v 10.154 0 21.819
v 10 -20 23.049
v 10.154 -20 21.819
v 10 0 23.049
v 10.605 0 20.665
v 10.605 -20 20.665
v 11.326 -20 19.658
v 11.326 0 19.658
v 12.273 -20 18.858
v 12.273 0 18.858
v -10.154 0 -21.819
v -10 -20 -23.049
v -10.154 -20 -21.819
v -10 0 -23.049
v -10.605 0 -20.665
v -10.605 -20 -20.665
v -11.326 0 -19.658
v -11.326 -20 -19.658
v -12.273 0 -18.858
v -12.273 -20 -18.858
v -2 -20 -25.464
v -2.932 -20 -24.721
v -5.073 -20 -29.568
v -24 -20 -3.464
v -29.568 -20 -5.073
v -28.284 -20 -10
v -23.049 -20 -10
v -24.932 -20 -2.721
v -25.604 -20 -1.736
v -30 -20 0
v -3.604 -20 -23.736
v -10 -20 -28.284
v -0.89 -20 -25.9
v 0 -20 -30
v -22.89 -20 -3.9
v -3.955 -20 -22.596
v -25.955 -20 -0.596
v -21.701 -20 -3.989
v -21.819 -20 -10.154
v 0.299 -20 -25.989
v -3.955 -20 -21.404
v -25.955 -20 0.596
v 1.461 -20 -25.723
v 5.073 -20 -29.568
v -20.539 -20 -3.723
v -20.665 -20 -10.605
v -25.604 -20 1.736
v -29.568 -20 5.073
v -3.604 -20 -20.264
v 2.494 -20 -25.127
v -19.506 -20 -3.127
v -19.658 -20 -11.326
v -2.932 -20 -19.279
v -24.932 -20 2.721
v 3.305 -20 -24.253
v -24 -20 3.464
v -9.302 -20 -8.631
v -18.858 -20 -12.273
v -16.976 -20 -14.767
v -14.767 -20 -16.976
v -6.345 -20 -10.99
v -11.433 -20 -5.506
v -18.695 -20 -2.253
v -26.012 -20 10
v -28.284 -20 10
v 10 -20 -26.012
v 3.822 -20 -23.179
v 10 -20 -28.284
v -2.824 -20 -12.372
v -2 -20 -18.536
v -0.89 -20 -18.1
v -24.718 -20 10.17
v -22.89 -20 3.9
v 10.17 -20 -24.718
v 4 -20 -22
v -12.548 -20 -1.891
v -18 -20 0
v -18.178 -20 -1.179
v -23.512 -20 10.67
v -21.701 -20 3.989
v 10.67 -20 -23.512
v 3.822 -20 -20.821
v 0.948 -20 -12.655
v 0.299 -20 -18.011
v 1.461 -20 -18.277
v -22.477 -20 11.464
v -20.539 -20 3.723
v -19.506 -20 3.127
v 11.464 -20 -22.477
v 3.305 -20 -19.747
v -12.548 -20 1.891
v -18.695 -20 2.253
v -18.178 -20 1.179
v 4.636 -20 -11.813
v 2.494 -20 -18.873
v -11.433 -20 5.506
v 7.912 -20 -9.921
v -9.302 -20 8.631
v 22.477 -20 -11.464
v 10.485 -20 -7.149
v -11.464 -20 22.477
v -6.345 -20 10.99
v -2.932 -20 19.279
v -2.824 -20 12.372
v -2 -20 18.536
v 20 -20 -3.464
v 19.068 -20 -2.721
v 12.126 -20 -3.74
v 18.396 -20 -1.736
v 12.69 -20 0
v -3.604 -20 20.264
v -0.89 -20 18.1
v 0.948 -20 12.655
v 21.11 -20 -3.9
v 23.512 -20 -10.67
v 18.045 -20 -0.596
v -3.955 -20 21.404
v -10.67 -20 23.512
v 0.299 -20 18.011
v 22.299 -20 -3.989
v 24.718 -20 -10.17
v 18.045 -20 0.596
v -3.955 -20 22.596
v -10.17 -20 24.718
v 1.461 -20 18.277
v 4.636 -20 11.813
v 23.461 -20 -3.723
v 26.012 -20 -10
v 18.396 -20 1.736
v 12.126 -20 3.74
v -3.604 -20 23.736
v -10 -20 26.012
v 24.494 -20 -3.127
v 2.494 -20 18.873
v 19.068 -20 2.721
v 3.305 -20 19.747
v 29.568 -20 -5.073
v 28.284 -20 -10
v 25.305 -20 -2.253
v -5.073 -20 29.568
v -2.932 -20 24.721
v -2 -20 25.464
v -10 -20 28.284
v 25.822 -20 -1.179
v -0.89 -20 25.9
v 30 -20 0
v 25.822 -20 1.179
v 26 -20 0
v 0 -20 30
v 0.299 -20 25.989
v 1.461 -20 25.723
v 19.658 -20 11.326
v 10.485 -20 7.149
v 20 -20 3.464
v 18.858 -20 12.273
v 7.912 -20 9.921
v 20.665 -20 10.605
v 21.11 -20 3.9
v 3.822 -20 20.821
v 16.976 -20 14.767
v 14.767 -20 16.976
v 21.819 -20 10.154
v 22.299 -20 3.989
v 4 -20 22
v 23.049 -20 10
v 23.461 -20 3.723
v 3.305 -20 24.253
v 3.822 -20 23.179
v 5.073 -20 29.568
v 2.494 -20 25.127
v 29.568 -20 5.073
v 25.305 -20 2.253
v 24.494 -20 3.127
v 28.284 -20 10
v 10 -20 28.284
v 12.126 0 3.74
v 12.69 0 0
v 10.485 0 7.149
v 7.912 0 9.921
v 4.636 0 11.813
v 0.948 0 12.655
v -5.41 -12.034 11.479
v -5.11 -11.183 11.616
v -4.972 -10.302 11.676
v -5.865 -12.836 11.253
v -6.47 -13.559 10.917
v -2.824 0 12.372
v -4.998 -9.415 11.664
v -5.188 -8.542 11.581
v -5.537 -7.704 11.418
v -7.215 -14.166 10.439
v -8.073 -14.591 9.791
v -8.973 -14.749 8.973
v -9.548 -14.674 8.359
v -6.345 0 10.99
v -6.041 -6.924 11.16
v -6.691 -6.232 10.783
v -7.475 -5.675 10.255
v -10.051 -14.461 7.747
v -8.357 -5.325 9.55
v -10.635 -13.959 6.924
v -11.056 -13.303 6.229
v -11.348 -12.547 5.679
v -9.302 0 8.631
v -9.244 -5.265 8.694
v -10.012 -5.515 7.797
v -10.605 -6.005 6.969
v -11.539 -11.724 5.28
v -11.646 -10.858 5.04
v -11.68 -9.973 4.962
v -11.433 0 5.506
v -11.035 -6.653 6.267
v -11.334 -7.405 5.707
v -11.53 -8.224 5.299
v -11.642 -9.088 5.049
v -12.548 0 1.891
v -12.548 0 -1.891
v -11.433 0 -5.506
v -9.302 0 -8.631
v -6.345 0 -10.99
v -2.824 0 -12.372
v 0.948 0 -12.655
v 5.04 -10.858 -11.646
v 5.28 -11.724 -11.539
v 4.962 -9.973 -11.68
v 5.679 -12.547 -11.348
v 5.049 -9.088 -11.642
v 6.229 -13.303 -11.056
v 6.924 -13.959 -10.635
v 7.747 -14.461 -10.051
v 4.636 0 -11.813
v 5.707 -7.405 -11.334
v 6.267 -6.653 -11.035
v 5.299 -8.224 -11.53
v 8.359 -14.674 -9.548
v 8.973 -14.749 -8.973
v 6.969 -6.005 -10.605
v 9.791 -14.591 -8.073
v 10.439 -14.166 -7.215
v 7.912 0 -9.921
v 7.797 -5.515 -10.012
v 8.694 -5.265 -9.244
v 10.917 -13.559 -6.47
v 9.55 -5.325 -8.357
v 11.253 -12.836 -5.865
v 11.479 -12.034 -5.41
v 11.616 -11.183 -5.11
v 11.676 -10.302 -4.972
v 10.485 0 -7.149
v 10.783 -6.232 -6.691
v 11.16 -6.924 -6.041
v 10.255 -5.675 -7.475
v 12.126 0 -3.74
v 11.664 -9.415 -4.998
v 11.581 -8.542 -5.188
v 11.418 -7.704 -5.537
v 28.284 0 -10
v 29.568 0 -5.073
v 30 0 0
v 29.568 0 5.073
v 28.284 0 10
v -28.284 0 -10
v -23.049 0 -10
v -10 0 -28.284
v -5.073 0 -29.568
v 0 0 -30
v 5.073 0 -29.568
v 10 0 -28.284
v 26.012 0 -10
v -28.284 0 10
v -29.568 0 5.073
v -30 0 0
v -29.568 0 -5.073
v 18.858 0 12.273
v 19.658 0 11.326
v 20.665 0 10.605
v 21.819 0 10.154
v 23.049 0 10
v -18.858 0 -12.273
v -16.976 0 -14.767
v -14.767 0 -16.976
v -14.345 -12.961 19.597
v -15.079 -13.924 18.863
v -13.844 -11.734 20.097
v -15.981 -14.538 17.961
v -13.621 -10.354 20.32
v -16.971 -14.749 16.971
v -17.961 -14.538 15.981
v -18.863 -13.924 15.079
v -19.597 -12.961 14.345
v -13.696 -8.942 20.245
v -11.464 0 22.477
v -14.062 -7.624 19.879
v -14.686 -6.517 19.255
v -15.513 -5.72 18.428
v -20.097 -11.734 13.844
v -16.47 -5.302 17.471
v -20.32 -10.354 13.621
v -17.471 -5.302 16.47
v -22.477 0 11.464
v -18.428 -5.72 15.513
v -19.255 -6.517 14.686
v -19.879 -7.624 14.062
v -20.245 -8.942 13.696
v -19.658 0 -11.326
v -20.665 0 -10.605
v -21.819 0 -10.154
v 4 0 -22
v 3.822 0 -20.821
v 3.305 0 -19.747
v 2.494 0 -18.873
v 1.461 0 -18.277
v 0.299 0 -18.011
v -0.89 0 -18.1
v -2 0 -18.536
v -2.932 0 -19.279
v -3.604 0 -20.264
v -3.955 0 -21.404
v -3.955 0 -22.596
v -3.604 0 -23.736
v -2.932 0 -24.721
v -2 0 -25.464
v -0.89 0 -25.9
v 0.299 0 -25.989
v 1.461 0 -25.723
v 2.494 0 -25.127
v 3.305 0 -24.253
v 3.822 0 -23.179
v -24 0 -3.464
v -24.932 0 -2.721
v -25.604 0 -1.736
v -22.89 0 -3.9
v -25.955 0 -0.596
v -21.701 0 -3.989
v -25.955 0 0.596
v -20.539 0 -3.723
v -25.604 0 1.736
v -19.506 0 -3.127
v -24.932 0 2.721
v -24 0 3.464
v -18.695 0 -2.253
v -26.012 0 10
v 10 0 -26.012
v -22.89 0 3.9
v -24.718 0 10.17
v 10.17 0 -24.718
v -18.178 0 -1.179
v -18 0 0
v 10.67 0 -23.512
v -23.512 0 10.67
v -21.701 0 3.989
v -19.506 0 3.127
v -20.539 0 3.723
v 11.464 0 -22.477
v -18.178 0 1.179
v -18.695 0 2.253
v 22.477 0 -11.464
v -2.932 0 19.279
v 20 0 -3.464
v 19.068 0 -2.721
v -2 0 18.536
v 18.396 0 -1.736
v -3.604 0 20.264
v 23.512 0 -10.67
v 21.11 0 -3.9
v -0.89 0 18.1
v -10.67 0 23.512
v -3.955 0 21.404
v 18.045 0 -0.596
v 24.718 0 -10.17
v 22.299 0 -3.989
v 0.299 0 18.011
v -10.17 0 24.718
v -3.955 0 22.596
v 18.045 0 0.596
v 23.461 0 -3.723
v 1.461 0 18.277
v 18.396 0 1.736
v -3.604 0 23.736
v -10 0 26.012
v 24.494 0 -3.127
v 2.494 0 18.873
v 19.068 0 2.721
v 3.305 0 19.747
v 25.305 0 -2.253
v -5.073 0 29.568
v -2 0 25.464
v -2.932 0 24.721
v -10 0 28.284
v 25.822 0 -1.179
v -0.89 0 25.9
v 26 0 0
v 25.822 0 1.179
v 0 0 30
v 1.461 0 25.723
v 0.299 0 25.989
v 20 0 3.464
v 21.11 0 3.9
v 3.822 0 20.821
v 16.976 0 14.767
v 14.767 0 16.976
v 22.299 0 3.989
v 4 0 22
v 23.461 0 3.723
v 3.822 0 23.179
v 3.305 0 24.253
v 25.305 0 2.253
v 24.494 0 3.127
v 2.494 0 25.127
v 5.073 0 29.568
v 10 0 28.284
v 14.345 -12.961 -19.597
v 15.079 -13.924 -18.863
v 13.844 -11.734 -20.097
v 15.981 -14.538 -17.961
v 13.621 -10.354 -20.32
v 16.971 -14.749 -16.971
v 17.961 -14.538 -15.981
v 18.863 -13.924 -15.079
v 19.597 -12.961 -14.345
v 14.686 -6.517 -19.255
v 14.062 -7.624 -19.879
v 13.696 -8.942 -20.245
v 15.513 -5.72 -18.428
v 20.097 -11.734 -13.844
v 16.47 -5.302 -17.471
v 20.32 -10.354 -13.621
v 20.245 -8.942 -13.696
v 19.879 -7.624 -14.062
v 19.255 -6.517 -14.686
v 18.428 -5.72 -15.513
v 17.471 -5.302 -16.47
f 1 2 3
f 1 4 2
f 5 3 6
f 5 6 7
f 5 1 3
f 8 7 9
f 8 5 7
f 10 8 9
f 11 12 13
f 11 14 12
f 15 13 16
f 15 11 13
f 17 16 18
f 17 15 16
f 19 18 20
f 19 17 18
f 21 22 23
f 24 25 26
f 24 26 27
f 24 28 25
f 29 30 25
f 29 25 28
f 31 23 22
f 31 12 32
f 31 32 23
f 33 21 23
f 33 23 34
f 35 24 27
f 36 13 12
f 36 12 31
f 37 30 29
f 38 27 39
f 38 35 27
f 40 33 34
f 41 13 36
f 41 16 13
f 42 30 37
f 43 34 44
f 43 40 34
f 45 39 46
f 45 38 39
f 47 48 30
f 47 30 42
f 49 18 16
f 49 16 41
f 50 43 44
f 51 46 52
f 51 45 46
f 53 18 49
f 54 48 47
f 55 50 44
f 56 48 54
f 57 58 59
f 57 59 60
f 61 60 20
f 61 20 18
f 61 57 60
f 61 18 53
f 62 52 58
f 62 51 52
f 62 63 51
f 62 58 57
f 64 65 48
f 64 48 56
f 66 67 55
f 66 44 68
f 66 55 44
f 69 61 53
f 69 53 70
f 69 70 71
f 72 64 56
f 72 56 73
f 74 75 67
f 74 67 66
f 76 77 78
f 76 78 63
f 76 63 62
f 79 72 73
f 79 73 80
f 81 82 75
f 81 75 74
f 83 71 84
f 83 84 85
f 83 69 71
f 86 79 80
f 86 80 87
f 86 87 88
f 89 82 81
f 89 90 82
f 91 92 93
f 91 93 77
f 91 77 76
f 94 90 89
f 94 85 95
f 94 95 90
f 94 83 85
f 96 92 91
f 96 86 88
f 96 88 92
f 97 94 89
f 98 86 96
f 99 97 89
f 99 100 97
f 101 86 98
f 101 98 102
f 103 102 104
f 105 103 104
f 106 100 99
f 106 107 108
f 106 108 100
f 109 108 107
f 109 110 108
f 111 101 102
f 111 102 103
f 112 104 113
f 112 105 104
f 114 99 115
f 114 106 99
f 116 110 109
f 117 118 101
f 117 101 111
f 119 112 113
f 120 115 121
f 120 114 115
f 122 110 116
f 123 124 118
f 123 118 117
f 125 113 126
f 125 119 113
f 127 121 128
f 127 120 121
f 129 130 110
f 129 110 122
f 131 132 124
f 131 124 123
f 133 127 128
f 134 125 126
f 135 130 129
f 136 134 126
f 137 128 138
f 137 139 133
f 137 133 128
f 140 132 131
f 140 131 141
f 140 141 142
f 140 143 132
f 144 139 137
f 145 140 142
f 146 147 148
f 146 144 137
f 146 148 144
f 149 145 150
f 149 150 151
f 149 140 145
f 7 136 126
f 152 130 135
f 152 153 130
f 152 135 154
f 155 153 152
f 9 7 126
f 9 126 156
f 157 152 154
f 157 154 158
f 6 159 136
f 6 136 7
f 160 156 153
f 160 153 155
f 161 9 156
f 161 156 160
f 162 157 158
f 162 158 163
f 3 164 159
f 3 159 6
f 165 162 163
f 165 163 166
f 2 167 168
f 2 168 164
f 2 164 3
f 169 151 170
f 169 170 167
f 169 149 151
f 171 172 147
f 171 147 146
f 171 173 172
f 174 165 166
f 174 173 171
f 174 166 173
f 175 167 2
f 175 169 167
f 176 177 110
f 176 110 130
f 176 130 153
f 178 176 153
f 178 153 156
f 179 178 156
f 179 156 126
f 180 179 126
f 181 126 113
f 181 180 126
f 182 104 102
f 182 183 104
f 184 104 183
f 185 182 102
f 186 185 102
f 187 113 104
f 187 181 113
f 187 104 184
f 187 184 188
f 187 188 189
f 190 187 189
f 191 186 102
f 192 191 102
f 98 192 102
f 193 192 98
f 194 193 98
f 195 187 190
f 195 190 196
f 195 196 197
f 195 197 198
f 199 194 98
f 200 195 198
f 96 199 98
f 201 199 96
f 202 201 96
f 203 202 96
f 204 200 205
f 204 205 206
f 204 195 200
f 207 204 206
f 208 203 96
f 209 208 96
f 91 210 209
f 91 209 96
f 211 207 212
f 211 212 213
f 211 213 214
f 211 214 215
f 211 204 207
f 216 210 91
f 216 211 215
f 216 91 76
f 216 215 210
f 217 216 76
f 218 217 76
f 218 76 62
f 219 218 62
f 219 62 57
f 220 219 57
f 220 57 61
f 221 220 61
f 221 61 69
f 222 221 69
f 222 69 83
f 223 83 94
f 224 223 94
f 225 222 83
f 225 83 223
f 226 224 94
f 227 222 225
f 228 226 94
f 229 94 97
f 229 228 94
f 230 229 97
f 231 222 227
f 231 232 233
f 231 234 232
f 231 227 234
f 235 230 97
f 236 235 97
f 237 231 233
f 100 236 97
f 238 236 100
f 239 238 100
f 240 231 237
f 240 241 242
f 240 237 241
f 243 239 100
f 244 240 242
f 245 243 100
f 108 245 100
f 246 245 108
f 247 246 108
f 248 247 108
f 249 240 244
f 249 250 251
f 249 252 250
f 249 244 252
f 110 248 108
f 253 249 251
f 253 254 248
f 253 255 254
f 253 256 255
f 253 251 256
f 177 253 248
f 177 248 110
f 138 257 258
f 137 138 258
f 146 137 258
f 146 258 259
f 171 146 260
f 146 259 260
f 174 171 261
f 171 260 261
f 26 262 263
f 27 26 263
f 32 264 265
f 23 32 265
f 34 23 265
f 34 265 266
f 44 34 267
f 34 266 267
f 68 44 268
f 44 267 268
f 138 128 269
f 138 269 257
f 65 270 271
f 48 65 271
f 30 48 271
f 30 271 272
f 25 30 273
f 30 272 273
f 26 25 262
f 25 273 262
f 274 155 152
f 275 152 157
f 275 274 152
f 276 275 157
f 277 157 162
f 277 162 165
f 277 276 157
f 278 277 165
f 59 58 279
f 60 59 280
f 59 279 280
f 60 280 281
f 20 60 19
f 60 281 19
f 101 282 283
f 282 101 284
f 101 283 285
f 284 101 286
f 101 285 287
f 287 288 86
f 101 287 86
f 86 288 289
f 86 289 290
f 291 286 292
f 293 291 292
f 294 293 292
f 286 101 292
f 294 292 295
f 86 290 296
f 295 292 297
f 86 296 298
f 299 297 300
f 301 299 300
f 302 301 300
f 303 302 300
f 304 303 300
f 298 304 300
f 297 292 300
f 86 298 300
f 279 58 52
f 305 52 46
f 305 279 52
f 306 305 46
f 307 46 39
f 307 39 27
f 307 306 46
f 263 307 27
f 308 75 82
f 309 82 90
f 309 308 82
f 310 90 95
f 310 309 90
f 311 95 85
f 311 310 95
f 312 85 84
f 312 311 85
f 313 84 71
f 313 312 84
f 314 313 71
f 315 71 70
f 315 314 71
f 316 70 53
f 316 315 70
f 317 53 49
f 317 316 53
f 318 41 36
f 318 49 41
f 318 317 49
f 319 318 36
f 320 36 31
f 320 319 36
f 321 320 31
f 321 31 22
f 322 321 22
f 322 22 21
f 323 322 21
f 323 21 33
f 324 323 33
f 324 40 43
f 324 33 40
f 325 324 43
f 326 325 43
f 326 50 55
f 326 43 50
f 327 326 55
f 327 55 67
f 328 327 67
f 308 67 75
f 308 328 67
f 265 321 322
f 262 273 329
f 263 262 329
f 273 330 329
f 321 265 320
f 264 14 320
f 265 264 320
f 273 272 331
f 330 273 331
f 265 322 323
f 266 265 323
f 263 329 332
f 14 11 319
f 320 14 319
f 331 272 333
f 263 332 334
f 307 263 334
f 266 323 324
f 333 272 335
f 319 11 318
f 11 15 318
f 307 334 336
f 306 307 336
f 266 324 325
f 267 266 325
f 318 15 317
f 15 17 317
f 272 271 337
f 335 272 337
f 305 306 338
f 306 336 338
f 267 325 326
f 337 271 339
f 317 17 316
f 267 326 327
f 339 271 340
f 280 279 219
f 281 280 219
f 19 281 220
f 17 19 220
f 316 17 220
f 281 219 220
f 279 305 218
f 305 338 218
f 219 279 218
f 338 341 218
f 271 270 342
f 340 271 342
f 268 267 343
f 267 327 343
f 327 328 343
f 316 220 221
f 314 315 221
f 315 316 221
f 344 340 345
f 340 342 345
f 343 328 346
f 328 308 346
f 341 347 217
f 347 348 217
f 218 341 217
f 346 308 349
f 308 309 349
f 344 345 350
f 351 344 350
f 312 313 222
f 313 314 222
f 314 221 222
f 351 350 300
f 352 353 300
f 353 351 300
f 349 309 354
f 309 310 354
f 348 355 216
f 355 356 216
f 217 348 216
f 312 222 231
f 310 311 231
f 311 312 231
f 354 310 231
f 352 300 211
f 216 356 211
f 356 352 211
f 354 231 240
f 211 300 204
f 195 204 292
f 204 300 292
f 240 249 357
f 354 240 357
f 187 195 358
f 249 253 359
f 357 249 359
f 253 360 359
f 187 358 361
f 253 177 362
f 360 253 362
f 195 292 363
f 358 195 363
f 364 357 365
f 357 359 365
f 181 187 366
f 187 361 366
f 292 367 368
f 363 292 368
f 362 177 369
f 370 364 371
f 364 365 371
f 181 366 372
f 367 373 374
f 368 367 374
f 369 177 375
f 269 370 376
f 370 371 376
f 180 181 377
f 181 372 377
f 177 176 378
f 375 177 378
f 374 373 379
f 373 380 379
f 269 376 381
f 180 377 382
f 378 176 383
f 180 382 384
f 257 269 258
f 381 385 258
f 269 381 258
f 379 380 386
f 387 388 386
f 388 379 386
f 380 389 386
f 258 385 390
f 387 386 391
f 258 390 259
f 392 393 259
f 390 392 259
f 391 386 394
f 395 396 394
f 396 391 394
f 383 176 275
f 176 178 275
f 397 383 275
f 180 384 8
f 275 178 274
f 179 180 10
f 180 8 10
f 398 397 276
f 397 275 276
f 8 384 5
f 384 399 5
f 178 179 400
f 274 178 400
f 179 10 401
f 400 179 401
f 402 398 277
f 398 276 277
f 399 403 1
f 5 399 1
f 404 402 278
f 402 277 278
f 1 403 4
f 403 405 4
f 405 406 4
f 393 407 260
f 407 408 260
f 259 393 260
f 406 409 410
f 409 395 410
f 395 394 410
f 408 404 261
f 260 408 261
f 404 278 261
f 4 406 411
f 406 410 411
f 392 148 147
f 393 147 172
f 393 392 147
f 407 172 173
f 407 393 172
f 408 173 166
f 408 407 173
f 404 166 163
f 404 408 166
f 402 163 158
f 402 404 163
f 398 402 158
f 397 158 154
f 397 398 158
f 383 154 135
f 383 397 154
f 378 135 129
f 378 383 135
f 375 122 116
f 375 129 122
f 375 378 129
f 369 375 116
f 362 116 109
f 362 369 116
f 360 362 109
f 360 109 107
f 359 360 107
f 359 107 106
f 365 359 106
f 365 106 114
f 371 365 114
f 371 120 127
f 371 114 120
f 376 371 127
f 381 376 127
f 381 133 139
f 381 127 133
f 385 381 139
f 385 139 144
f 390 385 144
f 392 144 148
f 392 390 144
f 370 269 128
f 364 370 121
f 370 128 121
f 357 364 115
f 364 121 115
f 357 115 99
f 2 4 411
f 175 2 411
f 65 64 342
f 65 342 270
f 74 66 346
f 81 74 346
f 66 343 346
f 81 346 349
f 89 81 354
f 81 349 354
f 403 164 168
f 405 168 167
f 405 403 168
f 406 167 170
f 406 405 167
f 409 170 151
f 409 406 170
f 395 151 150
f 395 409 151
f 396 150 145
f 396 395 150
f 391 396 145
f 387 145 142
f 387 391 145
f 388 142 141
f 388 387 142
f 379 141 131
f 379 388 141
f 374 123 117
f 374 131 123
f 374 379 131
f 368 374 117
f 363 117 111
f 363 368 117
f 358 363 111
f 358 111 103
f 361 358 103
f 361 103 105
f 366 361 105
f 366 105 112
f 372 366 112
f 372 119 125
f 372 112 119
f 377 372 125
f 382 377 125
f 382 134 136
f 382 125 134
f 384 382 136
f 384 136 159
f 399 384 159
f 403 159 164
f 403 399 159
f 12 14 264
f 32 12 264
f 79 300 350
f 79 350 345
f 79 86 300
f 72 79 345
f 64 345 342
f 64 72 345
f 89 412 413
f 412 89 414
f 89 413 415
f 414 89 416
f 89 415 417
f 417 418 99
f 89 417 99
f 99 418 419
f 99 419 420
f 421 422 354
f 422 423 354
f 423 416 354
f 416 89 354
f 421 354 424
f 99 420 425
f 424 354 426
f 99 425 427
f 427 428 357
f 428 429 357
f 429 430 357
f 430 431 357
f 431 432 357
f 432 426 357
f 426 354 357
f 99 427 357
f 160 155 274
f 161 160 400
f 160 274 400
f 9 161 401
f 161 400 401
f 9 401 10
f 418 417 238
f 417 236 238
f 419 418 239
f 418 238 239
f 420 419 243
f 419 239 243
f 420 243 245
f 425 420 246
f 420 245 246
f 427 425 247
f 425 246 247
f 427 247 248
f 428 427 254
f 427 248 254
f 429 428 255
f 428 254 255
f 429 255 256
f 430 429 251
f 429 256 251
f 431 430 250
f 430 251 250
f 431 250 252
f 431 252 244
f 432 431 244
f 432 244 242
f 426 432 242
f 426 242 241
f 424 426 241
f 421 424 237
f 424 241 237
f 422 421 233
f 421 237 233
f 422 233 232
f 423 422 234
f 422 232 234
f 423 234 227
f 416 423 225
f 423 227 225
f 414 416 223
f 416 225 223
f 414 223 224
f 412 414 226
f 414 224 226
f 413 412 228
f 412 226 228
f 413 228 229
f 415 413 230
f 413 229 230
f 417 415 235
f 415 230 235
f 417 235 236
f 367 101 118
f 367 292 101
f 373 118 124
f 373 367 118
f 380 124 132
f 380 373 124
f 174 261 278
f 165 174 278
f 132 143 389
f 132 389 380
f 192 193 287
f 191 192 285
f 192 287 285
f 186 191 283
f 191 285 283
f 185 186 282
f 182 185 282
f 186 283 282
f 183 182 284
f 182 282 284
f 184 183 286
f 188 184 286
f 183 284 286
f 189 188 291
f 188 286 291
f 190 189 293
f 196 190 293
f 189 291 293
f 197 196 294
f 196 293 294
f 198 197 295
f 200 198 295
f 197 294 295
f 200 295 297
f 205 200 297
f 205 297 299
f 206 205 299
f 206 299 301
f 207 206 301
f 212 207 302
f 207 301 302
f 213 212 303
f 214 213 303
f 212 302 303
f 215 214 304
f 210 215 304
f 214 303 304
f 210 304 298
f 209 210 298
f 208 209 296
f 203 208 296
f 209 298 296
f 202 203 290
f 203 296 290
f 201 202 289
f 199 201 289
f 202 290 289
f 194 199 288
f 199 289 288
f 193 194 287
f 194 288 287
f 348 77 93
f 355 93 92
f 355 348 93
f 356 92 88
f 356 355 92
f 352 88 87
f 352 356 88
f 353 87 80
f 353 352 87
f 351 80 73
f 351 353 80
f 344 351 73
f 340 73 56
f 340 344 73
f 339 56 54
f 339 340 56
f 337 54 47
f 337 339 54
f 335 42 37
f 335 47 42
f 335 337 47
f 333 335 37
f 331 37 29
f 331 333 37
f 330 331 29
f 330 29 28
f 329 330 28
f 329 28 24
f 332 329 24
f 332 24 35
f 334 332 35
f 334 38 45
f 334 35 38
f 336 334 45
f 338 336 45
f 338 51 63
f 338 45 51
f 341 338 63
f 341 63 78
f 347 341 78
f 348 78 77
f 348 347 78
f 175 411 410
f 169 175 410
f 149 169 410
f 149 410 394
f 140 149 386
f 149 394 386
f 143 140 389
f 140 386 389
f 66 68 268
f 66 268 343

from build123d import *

# Parameters (mm, degrees)
F0_R      = 22.5
F0_R_2    = 12.69
F1_DEPTH  = 20
F3_DEPTH  = 20
F5_R      = 4
F6_DEPTH  = 52.7
F8_DEPTH  = 20
F9_R      = 5
F10_R     = 4.75
F11_DEPTH = 55.8


with BuildPart() as f1:
    # F0 (on Front) → F1 (new body)
    with BuildSketch(Plane.XZ):
        Circle(F0_R)
        Circle(F0_R_2, mode=Mode.SUBTRACT)
    extrude(amount=F1_DEPTH)

    # F2 (on Front) → F3 (join)
    with BuildSketch(Plane.XZ):
        with BuildLine():
            Line((10, 14.3614066163), (10, 28.2842712475))
            ThreePointArc((10, 28.2842712475), (0, 30), (-10, 28.2842712475))
            Line((-10, 28.2842712475), (-10, 14.3614066163))
            ThreePointArc((-10, 14.3614066163), (0, 17.5), (10, 14.3614066163))
        make_face()
        with BuildLine():
            Line((-14.3614066163, 10), (-28.2842712475, 10))
            ThreePointArc((-28.2842712475, 10), (-30, 0), (-28.2842712475, -10))
            Line((-28.2842712475, -10), (-14.3614066163, -10))
            ThreePointArc((-14.3614066163, -10), (-17.5, 0), (-14.3614066163, 10))
        make_face()
        with BuildLine():
            ThreePointArc((28.2842712475, -10), (30, 0), (28.2842712475, 10))
            Line((28.2842712475, 10), (14.3614066163, 10))
            ThreePointArc((14.3614066163, 10), (17.5, 0), (14.3614066163, -10))
            Line((14.3614066163, -10), (28.2842712475, -10))
        make_face()
        with BuildLine():
            Line((-10, -14.3614066163), (-10, -28.2842712475))
            ThreePointArc((-10, -28.2842712475), (0, -30), (10, -28.2842712475))
            Line((10, -28.2842712475), (10, -14.3614066163))
            ThreePointArc((10, -14.3614066163), (0, -17.5), (-10, -14.3614066163))
        make_face()
    extrude(amount=F3_DEPTH)

    # F5 (on Front) → F6 (cut)
    with BuildSketch(Plane.XZ):
        with Locations((0, 22)):
            Circle(F5_R)
        with Locations((0, -22)):
            Circle(F5_R)
        with Locations((22, 0)):
            Circle(F5_R)
        with Locations((-22, 0)):
            Circle(F5_R)
    extrude(amount=F6_DEPTH, mode=Mode.SUBTRACT)

    # F7 (on Front) → F8 (join)
    with BuildSketch(Plane.XZ):
        with BuildLine():
            Line((-7, 26.941125497), (-26.941125497, 7))
            Line((-26.941125497, 7), (-13.2664991614, 7))
            ThreePointArc((-13.2664991614, 7), (-10.6066017178, 10.6066017178), (-7, 13.2664991614))
            Line((-7, 13.2664991614), (-7, 26.941125497))
        make_face()
        with BuildLine():
            Line((26.941125497, -7), (13.2664991614, -7))
            ThreePointArc((13.2664991614, -7), (10.6066017178, -10.6066017178), (7, -13.2664991614))
            Line((7, -13.2664991614), (7, -26.941125497))
            Line((7, -26.941125497), (26.941125497, -7))
        make_face()
    extrude(amount=F8_DEPTH)

    # F9
    f9_edges = [f1.edges().sort_by_distance(p)[0] for p in [
        (10, -10, 20.155644),
        (20.155644, -10, 10),
        (-10, -10, -20.155644),
        (-20.155644, -10, -10),
        (-10, -10, 23.941125),
        (-23.941125, -10, 10),
        (23.941125, -10, -10),
        (10, -10, -23.941125),
    ]]
    fillet(f9_edges, radius=F9_R)

    # F10 (on face) → F11 (cut, symmetric)
    with BuildSketch(Plane(origin=(-16.9705627485, 0, 16.9705627485), x_dir=(0, -1, 0), z_dir=(-0.7071067812, 0, 0.7071067812))):
        with Locations((9.9991243333, 0)):
            Circle(F10_R)
    extrude(amount=F11_DEPTH, both=True, mode=Mode.SUBTRACT)


solid = f1.part
